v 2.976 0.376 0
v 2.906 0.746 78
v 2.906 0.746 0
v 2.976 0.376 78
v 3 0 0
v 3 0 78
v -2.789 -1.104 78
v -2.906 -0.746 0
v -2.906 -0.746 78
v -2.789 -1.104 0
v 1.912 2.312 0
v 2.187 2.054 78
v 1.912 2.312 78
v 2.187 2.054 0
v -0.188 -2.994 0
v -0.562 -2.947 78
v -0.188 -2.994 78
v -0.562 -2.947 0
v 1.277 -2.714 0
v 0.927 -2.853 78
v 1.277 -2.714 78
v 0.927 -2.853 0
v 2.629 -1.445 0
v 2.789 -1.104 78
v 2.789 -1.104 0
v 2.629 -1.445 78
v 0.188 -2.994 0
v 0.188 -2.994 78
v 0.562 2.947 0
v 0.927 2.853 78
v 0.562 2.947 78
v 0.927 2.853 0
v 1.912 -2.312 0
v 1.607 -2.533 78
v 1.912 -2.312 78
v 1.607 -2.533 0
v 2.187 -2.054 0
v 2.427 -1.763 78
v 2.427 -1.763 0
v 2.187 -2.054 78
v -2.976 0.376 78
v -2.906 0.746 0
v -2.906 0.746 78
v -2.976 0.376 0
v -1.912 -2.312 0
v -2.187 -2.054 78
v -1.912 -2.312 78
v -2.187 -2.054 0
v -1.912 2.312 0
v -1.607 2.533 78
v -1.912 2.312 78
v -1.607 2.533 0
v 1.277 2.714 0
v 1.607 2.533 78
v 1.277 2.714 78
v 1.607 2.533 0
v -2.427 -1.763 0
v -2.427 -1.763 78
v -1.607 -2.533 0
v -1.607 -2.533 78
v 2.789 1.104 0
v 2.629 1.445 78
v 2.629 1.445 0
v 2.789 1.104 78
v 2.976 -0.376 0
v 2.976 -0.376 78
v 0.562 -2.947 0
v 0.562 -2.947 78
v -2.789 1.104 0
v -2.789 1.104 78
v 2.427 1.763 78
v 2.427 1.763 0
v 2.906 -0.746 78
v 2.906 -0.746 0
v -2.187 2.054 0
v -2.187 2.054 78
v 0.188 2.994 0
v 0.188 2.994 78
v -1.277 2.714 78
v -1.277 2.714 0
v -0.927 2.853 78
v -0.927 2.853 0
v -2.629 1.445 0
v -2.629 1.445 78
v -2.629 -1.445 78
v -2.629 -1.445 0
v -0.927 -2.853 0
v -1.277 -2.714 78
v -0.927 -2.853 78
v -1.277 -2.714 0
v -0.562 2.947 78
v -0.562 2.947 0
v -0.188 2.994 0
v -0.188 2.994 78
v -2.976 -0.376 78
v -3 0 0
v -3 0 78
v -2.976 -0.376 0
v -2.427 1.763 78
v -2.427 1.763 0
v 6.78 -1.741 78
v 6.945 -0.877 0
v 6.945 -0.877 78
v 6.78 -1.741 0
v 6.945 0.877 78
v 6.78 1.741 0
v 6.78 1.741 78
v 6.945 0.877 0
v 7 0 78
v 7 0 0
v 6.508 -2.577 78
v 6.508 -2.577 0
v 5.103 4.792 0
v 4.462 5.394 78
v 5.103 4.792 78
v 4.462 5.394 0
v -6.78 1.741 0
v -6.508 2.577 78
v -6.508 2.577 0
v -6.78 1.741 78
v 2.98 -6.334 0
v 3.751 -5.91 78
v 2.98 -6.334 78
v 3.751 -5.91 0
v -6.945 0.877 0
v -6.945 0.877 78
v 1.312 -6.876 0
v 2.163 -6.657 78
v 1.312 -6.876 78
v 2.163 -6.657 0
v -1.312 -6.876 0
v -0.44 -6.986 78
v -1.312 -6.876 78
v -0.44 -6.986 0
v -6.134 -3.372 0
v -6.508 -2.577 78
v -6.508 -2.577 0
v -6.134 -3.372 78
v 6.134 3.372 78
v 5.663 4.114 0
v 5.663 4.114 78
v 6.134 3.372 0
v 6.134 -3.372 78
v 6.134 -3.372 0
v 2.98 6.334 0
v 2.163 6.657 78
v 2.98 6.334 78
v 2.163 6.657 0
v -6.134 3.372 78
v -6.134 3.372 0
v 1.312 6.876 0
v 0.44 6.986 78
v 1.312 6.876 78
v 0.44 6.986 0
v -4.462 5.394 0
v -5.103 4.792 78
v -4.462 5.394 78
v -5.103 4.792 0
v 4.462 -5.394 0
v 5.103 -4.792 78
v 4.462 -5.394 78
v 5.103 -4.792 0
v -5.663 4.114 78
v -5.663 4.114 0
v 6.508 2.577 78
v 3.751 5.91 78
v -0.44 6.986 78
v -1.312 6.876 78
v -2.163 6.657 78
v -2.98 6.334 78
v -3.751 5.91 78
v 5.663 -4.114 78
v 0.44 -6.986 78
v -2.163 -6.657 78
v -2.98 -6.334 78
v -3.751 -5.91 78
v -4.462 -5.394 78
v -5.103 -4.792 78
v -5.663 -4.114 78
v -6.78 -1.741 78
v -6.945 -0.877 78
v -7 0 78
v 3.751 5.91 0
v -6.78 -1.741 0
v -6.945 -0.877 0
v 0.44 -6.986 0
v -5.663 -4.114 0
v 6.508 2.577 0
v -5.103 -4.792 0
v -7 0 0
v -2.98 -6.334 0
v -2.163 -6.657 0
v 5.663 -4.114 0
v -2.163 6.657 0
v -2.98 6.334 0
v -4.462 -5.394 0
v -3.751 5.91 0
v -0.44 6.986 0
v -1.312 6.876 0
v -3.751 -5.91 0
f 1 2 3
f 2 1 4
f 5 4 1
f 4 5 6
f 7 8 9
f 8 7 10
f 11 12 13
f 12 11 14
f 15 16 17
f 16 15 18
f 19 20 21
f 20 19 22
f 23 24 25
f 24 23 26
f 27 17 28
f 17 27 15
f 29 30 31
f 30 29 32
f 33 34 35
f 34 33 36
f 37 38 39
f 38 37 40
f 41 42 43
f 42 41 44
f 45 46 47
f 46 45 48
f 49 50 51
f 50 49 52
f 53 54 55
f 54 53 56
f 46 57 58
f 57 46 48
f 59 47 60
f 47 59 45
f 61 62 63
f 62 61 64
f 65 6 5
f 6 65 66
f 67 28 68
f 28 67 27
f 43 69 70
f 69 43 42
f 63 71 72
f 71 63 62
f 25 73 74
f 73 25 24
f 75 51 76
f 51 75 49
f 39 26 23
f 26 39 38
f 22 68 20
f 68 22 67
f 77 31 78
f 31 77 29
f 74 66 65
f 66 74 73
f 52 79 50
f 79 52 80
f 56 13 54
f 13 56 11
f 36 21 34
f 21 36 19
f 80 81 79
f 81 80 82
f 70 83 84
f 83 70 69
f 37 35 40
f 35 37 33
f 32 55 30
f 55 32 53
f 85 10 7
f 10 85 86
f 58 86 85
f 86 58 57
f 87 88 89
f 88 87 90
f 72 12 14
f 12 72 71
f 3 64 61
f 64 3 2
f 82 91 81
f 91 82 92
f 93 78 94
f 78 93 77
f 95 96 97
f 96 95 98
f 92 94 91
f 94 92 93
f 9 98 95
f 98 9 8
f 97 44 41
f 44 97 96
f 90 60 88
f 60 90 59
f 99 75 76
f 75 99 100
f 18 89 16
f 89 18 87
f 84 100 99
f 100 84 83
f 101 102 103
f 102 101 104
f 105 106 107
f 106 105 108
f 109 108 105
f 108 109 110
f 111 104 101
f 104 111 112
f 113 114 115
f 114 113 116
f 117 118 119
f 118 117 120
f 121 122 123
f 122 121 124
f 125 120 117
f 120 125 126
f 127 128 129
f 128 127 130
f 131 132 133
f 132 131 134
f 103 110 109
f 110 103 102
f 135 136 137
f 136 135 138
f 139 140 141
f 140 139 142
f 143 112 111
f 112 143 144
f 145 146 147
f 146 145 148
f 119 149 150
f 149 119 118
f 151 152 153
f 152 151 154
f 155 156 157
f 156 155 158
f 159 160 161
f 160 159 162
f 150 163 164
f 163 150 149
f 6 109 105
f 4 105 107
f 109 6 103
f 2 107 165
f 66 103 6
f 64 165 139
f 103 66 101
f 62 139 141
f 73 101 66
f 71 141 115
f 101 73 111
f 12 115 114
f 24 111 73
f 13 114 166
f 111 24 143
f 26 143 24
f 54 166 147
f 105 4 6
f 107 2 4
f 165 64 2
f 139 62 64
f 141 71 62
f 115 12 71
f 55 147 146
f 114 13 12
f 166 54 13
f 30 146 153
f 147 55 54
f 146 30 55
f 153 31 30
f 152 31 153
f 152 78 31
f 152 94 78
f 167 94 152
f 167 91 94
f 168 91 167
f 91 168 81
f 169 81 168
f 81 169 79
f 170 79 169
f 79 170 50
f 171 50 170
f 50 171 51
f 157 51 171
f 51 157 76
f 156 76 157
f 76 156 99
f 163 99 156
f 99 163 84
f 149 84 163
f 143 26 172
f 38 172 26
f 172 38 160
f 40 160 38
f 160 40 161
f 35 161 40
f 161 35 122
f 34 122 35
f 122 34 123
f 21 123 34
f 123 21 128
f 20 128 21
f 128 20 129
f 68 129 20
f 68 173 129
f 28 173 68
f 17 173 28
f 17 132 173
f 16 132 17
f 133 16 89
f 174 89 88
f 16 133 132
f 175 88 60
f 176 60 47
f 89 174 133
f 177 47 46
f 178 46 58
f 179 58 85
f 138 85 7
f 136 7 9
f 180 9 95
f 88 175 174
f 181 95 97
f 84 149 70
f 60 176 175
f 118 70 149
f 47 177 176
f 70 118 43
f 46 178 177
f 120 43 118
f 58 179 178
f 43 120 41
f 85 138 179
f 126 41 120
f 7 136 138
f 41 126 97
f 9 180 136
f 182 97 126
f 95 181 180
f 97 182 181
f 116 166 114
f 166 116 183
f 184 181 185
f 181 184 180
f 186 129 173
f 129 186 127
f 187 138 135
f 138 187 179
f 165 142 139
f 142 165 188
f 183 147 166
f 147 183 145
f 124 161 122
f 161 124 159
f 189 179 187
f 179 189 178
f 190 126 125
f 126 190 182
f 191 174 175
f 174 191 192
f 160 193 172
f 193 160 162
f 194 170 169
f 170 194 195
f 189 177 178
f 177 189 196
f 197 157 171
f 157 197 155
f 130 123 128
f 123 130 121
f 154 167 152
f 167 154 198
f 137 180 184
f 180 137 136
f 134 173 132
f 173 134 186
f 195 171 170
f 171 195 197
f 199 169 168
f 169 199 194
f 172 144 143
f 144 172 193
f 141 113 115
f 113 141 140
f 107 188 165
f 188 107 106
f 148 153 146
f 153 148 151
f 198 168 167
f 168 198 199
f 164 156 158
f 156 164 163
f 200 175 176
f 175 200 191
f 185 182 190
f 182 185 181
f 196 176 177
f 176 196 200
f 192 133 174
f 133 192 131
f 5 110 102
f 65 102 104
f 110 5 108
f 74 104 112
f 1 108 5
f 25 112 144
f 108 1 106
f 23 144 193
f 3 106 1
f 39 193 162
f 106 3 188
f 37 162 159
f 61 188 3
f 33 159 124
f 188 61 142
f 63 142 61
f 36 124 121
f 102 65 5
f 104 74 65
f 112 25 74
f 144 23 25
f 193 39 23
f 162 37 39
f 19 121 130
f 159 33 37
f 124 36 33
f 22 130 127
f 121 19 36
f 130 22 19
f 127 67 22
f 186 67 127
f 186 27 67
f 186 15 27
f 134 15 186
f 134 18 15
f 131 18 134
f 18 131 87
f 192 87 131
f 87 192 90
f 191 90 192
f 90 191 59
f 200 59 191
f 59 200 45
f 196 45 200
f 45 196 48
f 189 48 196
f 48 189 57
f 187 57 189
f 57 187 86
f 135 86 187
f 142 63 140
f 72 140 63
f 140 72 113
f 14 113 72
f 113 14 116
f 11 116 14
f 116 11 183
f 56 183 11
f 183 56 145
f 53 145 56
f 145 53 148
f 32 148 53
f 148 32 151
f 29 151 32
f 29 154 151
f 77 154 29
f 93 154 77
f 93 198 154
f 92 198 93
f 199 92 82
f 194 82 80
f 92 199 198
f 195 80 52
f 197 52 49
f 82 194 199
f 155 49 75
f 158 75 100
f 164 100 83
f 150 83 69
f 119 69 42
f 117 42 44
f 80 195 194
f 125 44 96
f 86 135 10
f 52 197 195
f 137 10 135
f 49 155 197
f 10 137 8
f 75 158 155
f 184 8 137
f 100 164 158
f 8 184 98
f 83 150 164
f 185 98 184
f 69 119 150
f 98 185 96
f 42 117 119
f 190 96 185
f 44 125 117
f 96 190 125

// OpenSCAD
$fn = 50;


difference() {
	union() {
		cylinder(h = 78, r = 7.0000000000);
	}
	union() {
		translate(v = [0, 0, -100]) {
			cylinder(h = 200, r = 3.0000000000);
		}
		translate(v = [0, 0, -100]) {
			cylinder(h = 200, r = 1.5000000000);
		}
	}
}
